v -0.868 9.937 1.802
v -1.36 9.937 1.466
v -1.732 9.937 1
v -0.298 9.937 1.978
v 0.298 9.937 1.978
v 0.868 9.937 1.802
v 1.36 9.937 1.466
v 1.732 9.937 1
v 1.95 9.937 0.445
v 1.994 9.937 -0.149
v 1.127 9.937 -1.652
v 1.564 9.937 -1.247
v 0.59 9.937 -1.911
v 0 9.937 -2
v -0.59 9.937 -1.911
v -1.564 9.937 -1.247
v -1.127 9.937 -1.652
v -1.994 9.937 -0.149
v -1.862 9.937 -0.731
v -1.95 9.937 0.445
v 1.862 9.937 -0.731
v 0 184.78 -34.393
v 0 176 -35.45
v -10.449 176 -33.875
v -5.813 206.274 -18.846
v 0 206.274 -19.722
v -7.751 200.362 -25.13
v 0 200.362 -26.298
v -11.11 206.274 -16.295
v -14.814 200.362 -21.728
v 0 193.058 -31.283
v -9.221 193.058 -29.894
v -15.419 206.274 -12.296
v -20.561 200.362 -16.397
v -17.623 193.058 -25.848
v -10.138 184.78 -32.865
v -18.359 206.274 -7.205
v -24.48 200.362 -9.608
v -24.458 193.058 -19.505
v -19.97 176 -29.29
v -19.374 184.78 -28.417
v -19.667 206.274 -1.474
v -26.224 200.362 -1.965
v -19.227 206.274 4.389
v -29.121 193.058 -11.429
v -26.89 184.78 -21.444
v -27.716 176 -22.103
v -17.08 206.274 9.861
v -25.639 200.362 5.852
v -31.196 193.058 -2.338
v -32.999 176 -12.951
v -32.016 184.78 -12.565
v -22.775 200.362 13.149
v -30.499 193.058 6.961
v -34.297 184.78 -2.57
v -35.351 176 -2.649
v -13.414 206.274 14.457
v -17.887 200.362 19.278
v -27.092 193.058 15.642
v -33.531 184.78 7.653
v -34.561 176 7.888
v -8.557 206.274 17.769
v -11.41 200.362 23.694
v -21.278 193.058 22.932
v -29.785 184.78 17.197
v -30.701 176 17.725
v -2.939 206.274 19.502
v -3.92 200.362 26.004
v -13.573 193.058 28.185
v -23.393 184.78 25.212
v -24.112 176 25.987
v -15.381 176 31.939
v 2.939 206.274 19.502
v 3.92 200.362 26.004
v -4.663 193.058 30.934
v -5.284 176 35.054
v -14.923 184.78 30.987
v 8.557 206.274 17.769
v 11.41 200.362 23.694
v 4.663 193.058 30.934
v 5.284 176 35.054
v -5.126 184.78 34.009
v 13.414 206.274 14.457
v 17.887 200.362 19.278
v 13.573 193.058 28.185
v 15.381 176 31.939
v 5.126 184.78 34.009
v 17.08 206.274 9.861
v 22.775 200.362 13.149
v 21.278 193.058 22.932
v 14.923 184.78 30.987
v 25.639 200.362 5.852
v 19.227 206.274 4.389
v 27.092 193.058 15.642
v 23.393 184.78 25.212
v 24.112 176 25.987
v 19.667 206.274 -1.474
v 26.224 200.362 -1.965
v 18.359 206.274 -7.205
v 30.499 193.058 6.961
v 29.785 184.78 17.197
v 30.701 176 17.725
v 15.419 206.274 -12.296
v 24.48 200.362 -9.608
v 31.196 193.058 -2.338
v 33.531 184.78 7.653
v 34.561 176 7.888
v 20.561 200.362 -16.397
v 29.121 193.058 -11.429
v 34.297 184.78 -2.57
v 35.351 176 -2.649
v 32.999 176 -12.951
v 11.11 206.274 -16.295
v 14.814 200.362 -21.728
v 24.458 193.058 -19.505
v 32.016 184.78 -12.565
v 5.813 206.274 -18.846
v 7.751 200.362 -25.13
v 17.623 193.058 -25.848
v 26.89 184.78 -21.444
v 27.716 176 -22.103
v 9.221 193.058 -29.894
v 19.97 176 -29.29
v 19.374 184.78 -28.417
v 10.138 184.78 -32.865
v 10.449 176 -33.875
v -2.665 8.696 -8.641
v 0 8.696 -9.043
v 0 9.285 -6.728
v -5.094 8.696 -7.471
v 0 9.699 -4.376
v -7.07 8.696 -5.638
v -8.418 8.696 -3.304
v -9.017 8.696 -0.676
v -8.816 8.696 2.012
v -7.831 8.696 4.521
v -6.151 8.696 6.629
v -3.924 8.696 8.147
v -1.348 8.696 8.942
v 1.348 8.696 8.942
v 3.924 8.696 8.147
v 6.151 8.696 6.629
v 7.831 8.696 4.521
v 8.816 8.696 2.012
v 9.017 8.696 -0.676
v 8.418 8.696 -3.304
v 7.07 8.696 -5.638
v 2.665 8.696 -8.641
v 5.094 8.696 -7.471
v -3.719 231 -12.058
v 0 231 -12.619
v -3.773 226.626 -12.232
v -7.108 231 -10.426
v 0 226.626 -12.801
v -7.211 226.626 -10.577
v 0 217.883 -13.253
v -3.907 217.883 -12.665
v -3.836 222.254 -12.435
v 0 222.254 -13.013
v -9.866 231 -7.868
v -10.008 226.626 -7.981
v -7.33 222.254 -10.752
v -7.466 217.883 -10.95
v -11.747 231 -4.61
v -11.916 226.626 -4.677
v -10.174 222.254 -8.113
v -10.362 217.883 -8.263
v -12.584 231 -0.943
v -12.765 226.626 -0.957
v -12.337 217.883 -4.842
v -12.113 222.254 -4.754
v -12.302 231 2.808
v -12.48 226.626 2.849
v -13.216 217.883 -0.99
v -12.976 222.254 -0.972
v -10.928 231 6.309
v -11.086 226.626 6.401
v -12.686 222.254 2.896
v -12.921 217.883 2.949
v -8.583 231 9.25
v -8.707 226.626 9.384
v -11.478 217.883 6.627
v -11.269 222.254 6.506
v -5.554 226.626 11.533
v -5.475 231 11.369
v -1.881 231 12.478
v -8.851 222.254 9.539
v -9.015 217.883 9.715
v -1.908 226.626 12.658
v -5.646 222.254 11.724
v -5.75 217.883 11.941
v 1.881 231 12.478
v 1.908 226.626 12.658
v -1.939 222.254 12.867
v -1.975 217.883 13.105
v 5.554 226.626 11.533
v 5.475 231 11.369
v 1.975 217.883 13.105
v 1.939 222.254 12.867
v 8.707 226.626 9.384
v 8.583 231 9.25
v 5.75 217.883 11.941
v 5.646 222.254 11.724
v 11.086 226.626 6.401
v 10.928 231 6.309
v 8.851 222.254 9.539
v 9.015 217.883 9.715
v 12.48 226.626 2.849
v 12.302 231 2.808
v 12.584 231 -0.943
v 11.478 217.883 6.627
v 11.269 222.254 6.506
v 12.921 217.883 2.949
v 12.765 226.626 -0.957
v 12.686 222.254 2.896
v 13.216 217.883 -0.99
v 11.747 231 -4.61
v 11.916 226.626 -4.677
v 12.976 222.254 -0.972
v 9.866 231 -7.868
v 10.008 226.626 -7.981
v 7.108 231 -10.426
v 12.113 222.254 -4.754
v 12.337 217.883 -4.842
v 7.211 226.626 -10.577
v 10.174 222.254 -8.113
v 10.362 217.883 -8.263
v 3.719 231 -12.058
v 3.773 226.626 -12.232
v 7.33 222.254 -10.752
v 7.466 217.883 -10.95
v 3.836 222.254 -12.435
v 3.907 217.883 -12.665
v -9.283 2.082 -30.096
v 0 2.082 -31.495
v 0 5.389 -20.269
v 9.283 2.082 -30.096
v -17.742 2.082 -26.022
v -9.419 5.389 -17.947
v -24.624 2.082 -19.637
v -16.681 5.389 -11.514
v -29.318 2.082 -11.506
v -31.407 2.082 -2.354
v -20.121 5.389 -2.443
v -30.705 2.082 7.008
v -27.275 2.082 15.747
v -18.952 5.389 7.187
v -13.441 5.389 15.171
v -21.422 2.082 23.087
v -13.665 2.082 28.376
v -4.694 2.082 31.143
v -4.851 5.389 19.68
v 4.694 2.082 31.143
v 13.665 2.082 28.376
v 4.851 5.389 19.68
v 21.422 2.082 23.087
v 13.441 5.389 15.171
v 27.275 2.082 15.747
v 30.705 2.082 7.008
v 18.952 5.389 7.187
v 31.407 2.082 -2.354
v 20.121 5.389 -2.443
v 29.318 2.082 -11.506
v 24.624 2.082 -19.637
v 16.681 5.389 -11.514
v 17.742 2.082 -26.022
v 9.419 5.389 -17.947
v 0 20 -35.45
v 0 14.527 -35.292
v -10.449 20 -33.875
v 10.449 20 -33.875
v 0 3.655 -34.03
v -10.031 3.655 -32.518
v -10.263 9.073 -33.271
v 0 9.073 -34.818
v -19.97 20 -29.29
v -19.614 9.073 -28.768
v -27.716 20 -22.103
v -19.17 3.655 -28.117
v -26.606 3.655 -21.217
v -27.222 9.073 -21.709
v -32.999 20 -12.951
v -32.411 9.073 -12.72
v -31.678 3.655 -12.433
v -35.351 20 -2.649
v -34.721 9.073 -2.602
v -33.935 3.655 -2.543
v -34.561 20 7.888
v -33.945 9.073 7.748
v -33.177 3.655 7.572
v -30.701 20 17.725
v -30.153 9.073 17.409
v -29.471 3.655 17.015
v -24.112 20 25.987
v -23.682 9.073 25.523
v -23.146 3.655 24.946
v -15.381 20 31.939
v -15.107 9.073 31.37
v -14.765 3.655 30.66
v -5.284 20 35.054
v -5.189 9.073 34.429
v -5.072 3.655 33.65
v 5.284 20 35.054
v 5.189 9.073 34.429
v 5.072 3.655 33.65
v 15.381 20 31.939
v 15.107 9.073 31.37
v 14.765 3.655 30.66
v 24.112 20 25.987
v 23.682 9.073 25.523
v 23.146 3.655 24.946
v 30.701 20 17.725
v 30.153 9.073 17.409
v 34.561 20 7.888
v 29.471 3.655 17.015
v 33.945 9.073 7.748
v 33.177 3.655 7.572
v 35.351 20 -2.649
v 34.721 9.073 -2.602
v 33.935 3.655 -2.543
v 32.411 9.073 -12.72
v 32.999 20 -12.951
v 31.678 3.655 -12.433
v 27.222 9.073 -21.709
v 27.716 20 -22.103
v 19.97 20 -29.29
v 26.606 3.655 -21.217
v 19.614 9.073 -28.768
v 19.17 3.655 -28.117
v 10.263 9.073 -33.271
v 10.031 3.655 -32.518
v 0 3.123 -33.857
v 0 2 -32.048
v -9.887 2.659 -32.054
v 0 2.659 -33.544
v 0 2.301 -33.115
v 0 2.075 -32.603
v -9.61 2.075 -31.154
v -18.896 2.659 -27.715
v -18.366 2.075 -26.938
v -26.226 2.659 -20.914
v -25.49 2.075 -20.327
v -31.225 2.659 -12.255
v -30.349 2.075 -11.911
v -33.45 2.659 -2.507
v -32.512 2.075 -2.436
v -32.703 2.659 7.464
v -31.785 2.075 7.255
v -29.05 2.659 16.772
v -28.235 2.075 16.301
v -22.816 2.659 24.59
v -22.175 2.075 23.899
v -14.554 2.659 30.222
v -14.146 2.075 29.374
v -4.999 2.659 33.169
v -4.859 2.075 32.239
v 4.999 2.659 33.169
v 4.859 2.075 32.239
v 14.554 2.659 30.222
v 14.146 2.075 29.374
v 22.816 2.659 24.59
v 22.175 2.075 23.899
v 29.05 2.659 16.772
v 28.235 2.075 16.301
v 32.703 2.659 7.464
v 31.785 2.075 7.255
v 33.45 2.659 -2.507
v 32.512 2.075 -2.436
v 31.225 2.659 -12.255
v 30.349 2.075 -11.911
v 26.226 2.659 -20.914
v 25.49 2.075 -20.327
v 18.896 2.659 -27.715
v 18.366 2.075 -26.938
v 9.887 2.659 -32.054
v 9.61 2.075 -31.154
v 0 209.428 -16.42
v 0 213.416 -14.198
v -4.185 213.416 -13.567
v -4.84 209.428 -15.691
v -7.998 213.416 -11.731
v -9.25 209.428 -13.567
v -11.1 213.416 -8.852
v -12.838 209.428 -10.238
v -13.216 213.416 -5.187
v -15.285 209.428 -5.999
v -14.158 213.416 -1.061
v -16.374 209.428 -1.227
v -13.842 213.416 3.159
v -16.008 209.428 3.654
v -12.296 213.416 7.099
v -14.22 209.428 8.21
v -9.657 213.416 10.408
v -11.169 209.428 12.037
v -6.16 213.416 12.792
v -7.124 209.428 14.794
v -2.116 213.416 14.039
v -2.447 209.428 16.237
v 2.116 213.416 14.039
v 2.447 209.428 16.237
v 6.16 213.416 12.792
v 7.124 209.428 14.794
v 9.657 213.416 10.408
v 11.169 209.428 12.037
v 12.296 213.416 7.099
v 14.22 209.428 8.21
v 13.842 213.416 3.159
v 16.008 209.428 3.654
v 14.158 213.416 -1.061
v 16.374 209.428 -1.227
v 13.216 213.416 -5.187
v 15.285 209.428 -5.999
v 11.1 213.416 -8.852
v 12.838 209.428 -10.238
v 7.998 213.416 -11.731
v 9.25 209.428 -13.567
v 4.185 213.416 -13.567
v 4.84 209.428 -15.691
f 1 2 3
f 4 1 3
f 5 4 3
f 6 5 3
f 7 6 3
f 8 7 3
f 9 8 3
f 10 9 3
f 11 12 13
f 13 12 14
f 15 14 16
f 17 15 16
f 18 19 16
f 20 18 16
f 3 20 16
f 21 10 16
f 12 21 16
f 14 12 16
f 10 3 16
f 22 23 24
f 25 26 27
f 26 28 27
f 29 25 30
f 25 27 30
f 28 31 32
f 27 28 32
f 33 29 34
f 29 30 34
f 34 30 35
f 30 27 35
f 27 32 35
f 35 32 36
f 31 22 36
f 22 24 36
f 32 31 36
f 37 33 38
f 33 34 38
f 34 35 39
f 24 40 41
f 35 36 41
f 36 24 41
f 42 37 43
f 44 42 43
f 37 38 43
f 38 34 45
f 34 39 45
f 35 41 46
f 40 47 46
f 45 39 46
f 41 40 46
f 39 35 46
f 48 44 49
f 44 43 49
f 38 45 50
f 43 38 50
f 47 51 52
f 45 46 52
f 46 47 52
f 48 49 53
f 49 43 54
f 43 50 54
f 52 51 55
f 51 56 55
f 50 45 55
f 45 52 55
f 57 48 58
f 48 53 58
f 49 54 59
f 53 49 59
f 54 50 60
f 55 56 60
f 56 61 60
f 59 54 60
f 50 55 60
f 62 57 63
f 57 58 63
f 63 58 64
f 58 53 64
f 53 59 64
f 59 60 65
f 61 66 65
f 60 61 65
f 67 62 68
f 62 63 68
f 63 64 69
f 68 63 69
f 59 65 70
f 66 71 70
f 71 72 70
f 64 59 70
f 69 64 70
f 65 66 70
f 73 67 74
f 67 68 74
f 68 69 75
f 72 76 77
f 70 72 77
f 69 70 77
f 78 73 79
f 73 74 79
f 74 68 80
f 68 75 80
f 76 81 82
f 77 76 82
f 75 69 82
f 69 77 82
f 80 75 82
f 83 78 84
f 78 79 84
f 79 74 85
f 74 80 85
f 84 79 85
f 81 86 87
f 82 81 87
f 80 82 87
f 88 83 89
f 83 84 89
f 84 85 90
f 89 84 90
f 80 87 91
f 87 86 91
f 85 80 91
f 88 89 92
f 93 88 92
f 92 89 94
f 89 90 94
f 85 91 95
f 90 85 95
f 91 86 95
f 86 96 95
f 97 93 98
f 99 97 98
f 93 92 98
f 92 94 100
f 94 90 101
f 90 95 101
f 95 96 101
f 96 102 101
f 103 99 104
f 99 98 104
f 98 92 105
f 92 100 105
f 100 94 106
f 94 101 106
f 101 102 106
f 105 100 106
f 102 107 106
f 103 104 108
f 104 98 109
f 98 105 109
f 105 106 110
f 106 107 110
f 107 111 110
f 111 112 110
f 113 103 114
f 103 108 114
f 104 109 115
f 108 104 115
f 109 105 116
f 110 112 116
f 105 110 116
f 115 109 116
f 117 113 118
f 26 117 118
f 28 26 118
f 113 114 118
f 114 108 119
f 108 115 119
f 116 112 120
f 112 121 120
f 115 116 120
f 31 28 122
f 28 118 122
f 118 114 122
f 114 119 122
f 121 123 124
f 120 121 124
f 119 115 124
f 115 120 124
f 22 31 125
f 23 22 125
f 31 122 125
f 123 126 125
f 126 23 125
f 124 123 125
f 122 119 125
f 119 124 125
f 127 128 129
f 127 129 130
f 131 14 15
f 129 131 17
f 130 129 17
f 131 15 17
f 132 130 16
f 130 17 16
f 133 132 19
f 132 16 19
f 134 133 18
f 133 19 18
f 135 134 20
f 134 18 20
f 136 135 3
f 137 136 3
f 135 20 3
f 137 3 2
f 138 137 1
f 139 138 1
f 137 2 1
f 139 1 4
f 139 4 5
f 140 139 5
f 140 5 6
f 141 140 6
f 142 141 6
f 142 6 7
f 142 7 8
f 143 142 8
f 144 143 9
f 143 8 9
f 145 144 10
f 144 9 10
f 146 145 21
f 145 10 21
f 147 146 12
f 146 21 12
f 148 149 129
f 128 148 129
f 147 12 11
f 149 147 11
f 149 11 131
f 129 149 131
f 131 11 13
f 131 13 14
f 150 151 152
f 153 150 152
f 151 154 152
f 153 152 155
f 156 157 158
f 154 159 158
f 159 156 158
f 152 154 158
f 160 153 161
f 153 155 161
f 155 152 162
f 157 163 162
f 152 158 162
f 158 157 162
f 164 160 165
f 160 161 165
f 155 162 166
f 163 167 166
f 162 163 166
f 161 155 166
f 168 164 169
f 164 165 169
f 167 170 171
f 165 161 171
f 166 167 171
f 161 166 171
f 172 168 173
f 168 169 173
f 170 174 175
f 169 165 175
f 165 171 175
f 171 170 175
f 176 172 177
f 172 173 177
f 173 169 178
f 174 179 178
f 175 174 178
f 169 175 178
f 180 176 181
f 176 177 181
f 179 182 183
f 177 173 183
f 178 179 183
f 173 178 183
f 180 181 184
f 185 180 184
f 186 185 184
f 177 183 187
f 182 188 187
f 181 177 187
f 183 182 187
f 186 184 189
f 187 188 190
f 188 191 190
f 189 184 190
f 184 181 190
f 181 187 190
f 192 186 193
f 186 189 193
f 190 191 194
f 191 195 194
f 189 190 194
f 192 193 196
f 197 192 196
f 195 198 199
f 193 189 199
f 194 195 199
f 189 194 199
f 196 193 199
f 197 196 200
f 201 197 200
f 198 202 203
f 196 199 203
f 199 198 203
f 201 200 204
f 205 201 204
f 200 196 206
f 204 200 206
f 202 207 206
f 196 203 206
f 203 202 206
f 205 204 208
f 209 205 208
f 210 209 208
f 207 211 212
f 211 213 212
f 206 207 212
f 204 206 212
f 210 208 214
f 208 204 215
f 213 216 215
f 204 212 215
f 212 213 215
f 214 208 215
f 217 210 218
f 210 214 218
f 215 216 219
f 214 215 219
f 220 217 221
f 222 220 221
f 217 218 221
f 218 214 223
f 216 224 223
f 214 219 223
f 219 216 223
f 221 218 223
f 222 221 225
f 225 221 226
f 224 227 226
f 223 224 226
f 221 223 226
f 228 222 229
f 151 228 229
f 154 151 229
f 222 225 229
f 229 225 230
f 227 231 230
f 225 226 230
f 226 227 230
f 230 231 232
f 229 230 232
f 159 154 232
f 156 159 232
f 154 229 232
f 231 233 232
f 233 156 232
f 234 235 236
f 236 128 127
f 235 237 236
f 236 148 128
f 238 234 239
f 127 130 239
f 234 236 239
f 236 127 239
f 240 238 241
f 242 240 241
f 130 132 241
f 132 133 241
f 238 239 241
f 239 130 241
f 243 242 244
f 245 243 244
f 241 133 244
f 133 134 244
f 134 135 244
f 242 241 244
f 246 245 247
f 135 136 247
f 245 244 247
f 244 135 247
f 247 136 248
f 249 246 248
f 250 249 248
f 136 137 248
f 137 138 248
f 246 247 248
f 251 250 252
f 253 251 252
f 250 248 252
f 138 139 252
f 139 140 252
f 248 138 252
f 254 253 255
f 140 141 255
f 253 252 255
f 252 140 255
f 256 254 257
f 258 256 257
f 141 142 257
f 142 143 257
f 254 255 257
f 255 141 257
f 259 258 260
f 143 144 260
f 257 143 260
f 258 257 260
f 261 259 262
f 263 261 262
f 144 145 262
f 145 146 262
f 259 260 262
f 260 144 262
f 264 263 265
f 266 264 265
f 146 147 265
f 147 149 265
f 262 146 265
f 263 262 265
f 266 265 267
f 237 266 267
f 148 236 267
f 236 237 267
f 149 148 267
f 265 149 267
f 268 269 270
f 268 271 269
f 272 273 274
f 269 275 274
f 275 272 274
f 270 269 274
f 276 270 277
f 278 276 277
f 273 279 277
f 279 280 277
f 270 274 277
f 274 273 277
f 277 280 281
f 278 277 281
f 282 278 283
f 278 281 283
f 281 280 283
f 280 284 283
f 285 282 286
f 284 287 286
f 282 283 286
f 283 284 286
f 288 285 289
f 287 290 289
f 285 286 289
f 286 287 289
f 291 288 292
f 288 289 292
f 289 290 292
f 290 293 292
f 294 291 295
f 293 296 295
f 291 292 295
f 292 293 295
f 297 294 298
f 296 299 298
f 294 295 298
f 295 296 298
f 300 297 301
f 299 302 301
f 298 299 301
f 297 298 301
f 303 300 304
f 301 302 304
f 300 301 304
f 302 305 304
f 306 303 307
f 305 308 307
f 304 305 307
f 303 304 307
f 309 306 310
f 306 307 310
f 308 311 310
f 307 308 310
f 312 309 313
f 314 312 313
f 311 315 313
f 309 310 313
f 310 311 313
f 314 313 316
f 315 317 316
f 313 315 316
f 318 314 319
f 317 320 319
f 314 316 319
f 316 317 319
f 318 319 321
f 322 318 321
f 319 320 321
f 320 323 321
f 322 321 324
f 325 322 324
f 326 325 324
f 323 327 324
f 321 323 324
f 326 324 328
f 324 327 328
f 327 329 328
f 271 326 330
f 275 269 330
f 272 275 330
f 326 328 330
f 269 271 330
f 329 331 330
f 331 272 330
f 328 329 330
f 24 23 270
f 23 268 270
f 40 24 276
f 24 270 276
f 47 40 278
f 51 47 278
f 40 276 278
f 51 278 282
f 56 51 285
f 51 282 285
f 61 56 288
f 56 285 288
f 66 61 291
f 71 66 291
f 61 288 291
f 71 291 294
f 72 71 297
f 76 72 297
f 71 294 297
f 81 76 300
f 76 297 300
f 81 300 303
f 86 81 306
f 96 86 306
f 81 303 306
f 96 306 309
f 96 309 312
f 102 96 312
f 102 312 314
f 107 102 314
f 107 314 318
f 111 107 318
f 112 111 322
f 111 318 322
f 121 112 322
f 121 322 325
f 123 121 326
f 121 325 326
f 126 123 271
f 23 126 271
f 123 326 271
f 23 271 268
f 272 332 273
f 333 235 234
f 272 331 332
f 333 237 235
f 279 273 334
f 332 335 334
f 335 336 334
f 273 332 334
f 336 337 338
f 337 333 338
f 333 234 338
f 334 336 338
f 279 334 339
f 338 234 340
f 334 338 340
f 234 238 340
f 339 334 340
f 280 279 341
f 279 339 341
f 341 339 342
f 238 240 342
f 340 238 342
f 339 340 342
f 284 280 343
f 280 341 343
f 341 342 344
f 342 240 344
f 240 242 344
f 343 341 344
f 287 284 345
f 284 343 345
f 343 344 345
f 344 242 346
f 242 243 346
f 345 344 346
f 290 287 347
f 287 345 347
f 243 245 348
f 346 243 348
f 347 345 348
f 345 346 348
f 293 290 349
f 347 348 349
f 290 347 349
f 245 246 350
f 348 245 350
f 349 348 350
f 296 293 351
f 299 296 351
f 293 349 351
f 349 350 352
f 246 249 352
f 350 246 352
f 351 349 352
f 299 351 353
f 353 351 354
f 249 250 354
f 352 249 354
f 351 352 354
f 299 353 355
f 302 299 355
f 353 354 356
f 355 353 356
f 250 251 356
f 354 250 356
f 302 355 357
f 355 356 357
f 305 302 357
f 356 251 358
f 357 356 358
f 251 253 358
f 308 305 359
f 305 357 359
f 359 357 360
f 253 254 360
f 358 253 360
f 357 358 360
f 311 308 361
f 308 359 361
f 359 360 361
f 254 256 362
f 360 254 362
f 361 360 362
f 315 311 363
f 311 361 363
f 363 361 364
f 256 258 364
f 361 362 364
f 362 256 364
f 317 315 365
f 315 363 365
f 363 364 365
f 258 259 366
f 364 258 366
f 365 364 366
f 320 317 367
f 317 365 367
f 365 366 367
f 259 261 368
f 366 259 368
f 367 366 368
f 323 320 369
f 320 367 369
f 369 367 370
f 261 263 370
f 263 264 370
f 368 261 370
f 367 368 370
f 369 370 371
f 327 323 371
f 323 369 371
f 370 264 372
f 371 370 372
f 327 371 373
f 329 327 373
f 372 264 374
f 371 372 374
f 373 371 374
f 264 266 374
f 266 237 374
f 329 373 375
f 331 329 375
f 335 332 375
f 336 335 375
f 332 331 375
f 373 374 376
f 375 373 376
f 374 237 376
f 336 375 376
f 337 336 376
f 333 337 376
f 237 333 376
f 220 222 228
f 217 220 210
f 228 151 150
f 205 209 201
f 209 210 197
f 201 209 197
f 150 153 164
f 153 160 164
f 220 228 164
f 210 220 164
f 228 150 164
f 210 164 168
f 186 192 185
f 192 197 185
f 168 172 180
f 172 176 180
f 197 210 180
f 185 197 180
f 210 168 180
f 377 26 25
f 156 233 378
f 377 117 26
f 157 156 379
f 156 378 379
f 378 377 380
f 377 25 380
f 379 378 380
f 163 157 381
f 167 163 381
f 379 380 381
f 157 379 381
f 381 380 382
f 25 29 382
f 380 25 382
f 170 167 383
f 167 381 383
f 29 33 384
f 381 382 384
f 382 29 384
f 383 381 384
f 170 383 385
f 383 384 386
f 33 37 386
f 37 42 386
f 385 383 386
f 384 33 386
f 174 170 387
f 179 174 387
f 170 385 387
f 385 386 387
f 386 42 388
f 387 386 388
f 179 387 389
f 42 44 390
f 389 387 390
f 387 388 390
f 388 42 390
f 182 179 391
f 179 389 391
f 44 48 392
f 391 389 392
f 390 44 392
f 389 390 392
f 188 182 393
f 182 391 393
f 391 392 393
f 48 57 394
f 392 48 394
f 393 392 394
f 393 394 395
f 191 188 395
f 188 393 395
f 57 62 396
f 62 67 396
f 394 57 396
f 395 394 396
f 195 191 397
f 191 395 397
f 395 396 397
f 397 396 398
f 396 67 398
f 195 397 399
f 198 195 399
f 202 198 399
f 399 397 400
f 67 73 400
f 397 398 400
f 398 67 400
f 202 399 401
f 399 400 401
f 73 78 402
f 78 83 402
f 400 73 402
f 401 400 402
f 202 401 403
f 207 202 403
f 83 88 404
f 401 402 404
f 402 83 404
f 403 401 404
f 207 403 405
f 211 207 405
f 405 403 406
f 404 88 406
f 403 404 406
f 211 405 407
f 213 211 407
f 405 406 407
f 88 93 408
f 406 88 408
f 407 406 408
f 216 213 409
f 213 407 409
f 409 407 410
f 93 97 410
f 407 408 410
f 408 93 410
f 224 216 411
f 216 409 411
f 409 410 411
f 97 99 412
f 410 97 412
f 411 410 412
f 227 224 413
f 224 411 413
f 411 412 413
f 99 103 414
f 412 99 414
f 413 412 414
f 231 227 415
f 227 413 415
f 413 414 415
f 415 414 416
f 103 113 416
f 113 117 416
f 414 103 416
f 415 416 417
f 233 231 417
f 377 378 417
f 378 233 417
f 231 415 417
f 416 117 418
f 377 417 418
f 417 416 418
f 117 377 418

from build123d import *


with BuildPart() as part:
    # Skica1 → Rotovat1 (revolve)
    with BuildSketch(Plane.XY, mode=Mode.PRIVATE) as rotovat1_sk:
        with BuildLine():
            Line((-2, 9.937438845), (0, 9.937438845))
            Line((0, 9.937438845), (0, 231))
            Line((0, 231), (-12.618810271, 231))
            ThreePointArc((-12.618810271, 231), (-12.903232124, 224.440073791), (-13.253405947, 217.883328719))
            ThreePointArc((-13.253405947, 217.883328719), (-15.159184085, 211.33843471), (-19.721855633, 206.273885742))
            ThreePointArc((-19.721855633, 206.273885742), (-31.283356959, 193.057862433), (-35.45, 176))
            Line((-35.45, 176), (-35.45, 20))
            ThreePointArc((-35.45, 20), (-35.094324076, 11.796758267), (-34.029965847, 3.655086334))
            ThreePointArc((-34.029965847, 3.655086334), (-33.114653771, 2.300717404), (-31.494757975, 2.081516571))
            Line((-31.494757975, 2.081516571), (-9.042779517, 8.69573486))
            ThreePointArc((-9.042779517, 8.69573486), (-5.556185927, 9.513946086), (-2, 9.937438845))
        make_face()
    revolve(rotovat1_sk.sketch.rotate(Axis((0, 0, 0), (0, 1, 0)), 270), axis=Axis((0, 0, 0), (0, 1, 0)))


solid = part.part
